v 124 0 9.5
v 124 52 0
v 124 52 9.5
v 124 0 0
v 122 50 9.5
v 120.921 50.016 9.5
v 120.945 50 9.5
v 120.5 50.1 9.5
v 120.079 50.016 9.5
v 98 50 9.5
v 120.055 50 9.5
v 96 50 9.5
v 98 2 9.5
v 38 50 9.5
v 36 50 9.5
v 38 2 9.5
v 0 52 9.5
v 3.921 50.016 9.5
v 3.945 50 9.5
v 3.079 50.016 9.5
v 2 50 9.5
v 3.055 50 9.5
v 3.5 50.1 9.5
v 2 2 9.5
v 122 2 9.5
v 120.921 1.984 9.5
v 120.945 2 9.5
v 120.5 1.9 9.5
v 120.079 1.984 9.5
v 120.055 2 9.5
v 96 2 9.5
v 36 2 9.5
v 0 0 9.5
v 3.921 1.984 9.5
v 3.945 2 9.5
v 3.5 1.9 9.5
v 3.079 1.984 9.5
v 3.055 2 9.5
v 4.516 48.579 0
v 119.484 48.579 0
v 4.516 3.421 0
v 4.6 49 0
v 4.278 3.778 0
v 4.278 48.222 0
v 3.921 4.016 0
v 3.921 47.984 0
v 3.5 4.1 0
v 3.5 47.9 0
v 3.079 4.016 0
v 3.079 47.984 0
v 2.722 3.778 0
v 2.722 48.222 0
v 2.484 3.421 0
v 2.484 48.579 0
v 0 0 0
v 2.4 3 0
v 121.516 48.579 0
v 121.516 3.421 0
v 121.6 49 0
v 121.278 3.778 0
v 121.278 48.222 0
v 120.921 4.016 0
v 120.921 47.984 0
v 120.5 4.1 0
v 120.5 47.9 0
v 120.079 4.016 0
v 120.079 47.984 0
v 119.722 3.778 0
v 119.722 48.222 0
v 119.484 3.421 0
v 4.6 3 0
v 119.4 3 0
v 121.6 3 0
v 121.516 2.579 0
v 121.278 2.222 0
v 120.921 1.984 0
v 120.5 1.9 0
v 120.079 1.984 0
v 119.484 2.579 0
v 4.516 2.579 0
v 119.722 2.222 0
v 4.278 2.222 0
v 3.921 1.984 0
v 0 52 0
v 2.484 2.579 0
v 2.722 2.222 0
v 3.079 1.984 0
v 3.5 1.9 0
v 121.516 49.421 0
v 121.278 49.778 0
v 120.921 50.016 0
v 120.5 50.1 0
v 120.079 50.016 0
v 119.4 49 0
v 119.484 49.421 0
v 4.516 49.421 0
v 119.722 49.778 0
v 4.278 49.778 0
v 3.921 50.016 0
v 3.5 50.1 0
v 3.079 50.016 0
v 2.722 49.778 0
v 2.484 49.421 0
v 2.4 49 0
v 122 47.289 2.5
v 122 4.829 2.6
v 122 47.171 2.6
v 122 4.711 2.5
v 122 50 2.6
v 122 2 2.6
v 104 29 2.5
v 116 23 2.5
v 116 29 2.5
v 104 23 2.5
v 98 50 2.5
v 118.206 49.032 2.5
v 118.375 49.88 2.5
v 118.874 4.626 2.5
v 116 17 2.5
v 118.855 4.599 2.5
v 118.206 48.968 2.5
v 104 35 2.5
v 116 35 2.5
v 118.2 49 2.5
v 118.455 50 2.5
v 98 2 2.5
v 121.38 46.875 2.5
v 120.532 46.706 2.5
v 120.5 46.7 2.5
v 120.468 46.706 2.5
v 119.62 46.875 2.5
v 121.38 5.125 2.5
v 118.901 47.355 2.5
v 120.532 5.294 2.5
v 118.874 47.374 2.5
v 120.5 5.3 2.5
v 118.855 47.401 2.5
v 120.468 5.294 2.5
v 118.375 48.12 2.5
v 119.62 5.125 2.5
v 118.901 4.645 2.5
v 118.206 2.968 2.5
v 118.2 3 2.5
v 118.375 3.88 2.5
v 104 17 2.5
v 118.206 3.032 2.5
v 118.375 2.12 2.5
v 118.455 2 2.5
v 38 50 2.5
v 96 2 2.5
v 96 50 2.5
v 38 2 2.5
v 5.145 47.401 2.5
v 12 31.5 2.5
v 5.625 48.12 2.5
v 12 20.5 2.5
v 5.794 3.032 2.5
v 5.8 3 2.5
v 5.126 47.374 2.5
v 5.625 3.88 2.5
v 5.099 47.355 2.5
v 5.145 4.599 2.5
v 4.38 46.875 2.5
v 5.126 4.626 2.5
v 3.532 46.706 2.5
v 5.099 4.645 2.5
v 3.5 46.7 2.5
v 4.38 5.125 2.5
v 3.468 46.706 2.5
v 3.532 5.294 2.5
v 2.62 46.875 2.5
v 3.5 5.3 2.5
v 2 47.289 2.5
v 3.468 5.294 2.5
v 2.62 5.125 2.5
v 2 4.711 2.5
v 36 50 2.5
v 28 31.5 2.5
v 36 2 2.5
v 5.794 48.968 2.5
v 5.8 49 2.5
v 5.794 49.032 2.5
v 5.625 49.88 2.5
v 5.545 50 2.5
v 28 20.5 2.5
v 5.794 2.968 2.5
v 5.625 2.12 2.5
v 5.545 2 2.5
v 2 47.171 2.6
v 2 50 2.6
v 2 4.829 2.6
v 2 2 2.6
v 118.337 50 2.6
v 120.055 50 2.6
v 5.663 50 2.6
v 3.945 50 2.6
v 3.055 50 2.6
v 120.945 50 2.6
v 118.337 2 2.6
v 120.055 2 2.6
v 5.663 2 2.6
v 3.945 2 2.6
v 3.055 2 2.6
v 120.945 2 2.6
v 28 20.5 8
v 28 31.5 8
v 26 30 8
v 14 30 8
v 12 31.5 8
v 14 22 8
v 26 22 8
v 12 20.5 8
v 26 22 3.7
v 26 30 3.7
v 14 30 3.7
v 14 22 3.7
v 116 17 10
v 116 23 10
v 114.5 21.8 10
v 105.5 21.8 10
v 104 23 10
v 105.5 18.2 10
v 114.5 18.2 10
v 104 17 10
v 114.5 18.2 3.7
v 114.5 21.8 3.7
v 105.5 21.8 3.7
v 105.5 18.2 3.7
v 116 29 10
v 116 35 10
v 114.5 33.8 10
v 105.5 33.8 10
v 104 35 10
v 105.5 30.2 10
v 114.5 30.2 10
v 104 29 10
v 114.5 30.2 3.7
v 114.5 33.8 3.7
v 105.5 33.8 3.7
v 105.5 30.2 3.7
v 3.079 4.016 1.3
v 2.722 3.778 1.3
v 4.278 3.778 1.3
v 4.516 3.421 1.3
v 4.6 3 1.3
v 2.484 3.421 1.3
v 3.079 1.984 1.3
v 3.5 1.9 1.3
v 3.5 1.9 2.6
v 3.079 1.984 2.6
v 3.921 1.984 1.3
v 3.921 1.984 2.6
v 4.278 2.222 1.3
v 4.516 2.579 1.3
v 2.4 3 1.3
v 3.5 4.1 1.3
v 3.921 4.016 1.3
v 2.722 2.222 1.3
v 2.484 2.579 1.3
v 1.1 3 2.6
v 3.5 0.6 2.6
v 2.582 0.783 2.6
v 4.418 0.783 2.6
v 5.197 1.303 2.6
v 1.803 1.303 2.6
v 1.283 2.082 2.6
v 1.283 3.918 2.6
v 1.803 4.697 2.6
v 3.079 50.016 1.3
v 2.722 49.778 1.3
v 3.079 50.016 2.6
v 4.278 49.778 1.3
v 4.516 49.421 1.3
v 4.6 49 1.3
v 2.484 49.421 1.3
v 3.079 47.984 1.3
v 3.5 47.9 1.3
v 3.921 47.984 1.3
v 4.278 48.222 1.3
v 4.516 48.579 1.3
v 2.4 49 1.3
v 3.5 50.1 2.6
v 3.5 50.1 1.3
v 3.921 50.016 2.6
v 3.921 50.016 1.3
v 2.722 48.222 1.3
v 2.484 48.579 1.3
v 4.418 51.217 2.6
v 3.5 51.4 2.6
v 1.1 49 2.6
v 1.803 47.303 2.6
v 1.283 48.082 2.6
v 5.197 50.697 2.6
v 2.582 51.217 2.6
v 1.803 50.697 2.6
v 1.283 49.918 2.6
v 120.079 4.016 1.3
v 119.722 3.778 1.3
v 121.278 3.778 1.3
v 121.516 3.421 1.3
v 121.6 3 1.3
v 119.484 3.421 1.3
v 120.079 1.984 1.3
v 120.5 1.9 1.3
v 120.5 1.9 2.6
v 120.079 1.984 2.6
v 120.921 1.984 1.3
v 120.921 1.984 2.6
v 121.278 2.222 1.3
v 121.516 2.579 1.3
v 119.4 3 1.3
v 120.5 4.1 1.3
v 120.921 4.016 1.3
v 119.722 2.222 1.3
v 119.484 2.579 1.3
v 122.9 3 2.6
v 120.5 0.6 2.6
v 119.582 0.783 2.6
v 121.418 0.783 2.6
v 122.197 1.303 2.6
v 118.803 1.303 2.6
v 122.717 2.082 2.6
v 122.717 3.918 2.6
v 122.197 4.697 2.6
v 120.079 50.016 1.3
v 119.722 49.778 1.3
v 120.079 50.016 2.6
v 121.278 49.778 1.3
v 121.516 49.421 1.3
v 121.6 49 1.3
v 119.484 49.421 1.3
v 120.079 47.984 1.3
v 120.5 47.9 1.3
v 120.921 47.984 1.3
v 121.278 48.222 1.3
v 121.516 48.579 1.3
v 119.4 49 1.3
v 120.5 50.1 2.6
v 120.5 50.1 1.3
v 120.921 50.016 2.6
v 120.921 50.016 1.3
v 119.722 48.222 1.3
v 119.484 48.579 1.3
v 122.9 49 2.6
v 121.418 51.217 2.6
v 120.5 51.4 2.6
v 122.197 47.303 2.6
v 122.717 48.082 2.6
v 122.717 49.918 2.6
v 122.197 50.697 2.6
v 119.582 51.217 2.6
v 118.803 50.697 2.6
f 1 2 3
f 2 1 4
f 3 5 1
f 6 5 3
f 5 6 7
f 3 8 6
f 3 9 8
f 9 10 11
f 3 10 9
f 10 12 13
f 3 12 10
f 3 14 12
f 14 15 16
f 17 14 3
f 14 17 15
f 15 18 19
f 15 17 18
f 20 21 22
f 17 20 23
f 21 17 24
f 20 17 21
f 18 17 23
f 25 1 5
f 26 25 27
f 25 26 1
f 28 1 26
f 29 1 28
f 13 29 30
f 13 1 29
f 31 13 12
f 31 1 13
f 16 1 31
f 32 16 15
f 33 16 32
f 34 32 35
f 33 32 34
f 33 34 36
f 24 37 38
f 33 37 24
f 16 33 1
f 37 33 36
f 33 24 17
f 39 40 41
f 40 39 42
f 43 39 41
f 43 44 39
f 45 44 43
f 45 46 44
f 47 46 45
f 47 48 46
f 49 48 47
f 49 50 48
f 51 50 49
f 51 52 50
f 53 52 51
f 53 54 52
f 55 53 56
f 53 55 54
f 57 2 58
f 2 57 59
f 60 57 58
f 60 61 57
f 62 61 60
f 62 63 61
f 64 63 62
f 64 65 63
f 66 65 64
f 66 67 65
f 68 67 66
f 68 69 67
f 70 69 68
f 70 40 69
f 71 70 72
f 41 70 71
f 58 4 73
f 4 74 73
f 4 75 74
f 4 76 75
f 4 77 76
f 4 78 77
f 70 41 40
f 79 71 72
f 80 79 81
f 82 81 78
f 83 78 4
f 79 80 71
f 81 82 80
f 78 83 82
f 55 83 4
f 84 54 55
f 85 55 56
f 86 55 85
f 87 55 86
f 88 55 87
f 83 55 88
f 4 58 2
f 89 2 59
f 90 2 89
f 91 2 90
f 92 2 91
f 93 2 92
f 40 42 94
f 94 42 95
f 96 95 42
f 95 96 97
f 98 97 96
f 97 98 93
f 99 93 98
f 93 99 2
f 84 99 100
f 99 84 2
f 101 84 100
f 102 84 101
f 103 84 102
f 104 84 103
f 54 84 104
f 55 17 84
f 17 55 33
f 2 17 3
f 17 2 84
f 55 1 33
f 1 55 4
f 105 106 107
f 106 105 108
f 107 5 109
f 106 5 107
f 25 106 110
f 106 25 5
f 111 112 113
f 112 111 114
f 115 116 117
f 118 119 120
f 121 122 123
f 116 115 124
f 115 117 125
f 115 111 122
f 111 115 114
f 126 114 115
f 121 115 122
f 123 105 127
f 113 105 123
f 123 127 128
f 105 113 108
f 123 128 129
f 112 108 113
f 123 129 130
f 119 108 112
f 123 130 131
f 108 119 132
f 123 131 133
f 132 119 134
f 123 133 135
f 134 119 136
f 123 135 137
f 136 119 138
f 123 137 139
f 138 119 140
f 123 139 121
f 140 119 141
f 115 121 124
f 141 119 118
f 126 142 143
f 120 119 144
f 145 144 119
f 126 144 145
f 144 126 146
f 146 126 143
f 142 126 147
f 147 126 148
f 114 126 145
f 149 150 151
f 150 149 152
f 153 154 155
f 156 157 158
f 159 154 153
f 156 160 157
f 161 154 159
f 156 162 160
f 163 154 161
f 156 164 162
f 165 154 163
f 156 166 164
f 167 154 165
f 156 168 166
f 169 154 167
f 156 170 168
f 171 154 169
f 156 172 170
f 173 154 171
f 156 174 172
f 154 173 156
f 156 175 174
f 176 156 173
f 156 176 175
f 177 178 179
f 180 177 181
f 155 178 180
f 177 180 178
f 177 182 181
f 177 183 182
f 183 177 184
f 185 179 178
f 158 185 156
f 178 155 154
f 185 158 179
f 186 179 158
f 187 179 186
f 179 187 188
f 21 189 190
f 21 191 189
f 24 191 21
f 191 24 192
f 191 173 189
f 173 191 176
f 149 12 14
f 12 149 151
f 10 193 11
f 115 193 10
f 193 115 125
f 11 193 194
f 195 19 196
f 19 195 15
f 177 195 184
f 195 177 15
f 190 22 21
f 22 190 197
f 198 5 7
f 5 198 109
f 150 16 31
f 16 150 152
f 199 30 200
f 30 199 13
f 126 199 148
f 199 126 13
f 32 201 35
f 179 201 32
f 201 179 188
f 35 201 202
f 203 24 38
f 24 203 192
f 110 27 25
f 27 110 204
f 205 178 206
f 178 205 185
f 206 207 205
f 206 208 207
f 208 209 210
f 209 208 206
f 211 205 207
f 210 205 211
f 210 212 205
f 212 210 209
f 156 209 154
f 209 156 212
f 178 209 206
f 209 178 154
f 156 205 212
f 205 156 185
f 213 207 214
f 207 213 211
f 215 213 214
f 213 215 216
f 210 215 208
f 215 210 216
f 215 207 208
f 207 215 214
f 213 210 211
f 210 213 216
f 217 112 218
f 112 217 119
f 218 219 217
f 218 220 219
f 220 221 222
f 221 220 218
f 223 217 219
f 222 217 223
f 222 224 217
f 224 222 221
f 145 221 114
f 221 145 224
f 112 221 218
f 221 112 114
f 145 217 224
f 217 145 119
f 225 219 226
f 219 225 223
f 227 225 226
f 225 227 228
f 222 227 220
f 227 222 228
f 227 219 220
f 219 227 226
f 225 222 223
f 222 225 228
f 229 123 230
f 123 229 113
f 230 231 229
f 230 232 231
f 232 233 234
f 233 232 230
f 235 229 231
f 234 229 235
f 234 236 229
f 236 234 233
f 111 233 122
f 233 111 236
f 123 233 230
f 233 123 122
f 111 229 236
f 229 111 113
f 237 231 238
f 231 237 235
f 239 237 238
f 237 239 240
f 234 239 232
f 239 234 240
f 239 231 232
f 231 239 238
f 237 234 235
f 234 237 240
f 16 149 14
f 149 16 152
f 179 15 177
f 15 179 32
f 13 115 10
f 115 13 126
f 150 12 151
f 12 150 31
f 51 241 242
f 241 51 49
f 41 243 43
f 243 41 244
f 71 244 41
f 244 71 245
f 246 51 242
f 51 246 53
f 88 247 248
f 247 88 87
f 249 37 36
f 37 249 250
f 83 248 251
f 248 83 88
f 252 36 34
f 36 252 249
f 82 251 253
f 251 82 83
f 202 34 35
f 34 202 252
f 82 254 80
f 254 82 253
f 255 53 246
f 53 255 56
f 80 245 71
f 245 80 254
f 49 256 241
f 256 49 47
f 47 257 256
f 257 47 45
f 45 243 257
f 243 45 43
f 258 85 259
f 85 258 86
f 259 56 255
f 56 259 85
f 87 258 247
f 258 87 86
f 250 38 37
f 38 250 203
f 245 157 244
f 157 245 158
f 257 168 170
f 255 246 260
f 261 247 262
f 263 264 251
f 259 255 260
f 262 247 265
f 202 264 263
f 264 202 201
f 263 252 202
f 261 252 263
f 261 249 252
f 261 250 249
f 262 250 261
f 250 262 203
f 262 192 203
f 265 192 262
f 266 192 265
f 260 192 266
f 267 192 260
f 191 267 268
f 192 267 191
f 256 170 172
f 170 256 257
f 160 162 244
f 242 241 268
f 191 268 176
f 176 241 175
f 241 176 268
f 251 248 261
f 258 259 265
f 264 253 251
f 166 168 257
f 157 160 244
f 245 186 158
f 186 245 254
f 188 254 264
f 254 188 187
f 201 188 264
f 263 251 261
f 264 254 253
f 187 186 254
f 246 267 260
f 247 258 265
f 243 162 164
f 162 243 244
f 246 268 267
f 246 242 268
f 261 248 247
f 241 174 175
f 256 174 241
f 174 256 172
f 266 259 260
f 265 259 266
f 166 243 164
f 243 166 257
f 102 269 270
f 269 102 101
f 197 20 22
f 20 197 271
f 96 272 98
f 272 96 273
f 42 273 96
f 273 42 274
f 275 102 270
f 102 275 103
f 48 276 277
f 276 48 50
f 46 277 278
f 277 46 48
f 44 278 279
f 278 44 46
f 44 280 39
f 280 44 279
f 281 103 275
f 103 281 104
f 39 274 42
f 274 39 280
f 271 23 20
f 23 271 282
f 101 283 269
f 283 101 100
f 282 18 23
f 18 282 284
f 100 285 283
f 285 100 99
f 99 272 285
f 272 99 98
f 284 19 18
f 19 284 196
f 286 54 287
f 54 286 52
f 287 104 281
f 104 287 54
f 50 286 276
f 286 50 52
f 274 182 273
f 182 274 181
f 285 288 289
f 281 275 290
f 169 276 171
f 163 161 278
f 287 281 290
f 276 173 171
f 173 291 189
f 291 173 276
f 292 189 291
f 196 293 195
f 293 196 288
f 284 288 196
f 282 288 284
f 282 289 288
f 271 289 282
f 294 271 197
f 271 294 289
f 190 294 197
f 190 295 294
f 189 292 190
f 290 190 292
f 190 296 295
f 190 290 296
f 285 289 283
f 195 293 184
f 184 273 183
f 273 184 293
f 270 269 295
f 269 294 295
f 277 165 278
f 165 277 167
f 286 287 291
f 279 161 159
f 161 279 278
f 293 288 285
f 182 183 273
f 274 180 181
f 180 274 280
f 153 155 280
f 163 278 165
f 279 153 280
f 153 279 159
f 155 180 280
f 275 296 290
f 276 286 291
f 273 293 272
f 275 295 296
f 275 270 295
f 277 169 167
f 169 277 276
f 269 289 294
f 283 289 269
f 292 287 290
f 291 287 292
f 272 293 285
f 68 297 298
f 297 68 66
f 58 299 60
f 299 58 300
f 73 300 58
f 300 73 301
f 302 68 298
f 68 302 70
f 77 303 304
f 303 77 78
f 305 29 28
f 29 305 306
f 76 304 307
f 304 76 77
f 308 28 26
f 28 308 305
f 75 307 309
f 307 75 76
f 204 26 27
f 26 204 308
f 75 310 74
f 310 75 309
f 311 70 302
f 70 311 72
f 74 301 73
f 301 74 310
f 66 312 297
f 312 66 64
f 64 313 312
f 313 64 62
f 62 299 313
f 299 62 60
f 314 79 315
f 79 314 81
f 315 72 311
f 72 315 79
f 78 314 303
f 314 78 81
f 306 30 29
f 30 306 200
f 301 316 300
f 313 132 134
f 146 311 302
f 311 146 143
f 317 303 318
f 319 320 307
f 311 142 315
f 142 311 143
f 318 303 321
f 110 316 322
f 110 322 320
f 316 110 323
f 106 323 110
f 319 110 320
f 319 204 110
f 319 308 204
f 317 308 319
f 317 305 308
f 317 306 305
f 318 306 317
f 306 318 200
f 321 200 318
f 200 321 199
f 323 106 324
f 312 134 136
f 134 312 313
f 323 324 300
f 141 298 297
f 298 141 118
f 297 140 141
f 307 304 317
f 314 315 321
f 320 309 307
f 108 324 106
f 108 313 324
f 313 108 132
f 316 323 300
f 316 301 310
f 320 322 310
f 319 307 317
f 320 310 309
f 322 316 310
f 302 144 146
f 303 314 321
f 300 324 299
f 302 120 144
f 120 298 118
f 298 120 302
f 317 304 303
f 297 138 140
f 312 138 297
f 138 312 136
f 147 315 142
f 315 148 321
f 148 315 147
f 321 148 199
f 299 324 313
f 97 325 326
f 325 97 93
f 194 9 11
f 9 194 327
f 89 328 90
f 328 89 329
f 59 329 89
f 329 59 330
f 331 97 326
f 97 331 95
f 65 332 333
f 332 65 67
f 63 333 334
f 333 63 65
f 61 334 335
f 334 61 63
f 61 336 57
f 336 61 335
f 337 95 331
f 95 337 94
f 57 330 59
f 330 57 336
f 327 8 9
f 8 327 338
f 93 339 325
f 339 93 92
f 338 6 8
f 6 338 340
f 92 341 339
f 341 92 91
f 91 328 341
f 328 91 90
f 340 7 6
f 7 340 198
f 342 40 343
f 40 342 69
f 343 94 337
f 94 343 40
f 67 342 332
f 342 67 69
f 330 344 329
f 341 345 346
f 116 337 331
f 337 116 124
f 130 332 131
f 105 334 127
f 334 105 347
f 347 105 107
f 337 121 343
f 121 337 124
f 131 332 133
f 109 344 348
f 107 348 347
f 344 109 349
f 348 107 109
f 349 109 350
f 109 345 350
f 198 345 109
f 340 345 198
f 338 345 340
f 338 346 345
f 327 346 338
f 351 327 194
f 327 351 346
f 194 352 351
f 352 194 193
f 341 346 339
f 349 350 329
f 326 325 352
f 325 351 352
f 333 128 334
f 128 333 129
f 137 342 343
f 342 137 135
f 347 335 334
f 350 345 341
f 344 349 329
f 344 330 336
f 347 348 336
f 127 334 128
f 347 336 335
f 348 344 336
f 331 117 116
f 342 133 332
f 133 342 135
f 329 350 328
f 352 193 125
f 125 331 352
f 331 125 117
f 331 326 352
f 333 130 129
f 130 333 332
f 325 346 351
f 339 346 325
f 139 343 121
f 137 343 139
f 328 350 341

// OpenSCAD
// file: ../../00_common/screw_bosses.scad
// =============================================================================
// OpenMotorBridge - Screw Bosses & Fastener Primitives
// =============================================================================
// File: hardware/cad/scad/00_common/screw_bosses.scad
// Description: Reusable parametric modules for screw standoffs, corner clamping
//              posts, and mounting ears.
// =============================================================================

include <parameters.scad>;

// 1. Cylindrical Screw Standoff Boss (with center hole)
module screw_boss(outer_r=2.5, inner_r=1.2, h=5.0) {
    difference() {
        cylinder(r=outer_r, h=h, center=false);
        translate([0, 0, -0.1])
            cylinder(r=inner_r, h=h + 0.2, center=false);
    }
}

// 2. Rectangular Corner Clamping Post (with center screw hole)
module corner_screw_post(size_x=5.0, size_y=5.0, h=12.0, hole_r=1.65, hole_h=10.0, hole_offset_z=2.0) {
    difference() {
        cube(size=[size_x, size_y, h], center=false);
        translate([size_x/2.0, size_y/2.0, hole_offset_z])
            cylinder(r=hole_r, h=hole_h + 0.1, center=false);
    }
}

// 3. M4 Silentblock Outer Mounting Ear (Centered in Y around y=0, extends along +X)
module mounting_ear_m4(ear_len=14.0, ear_w=12.0, ear_h=5.0, hole_r=2.2) {
    difference() {
        union() {
            translate([0, -ear_w/2.0, 0])
                cube(size=[ear_len - ear_w/2.0, ear_w, ear_h], center=false);
            translate([ear_len - ear_w/2.0, 0, 0])
                cylinder(r=ear_w/2.0, h=ear_h, center=false);
        }
        translate([ear_len - ear_w/2.0, 0, -0.1])
            cylinder(r=hole_r, h=ear_h + 0.2, center=false);
    }
}

// 4. Captive Hex Nut Pocket (DIN 934 / DIN 985 with center screw through-hole)
module hex_nut_pocket(sw=NUT_M4_SW, h=NUT_M4_H, screw_r=M4_SCREW_HOLE_R, through_h=10.0) {
    // Hexagonal pocket (flat-to-flat SW converted to circle radius: r = sw / sqrt(3))
    hex_r = sw / sqrt(3);
    union() {
        // Hexagonal nut pocket
        cylinder(r=hex_r, h=h, center=false, $fn=6);
        // Screw clearance through-hole
        translate([0, 0, -through_h/2.0])
            cylinder(r=screw_r, h=through_h + h, center=false, $fn=30);
    }
}
// file: ../../00_common/parameters.scad
// =============================================================================
// OpenMotorBridge - Global CAD Parameters & Settings
// =============================================================================
// File: hardware/cad/scad/00_common/parameters.scad
// Description: Global dimensional constants, manufacturing clearances and
//              circle resolution ($fn) for all OpenSCAD modules.
// =============================================================================

// --- 1. Circle & Curve Resolution ---
$fn = 60; // Smooth cylinders and holes for high-quality MJF 3D printing

// --- 2. Central Main Box Dimensions (3-Tier Sandwich) ---
MAIN_BOX_OUTER_L      = 110.0; // Outer length in X (mm)
MAIN_BOX_OUTER_W      = 74.0;  // Outer width in Y (mm)
MAIN_BOX_LOWER_H      = 17.0;  // Lower case height in Z (mm)
MAIN_BOX_MID_H        = 15.0;  // Mid tray height in Z (mm)
MAIN_BOX_LID_H        = 4.0;   // Lid plate thickness in Z (mm)
MAIN_BOX_WALL         = 2.5;   // Nominal wall thickness (mm)
MAIN_BOX_CORNER_POST  = 7.0;   // Corner clamping screw post size (mm, for M3 hex nut pockets)

// --- 3. Satellite Pod Dimensions (Universal Enlarged Envelope) ---
POD_OUTER_L           = 150.0; // Outer length in X (mm, standardized for serial PCBA 03 + Cardo/Sena/OMM)
POD_OUTER_W           = 70.0;  // Outer width in Y (mm)
POD_OUTER_H           = 38.0;  // Outer height in Z (mm)
POD_WALL              = 3.5;   // Nominal wall thickness (mm)
POD_BULKHEAD_X        = 18.0;  // Partition bulkhead position in X (mm)
POD_CHAMBER_L         = 132.0; // Sliding chamber length in X (mm, clears 130mm sled + 2mm margin)
POD_CHAMBER_W         = 63.0;  // Sliding chamber width in Y (mm)
POD_CHAMBER_H         = 31.0;  // Sliding chamber height in Z (mm)

// --- 4. Pod Linear Guide Rails (Poka-Yoke Tongue & Groove) ---
POD_GROOVE_W          = 3.0;   // Internal guide groove width in Z (mm)
POD_GROOVE_DEPTH      = 1.5;   // Internal guide groove depth in Y (mm)
POD_GROOVE_LEFT_Z     = 10.0;  // Center height of left groove (mm)
POD_GROOVE_RIGHT_Z    = 18.0;  // Center height of right groove (mm, asym offset)

CARTRIDGE_TONGUE_W    = 2.6;   // Cartridge tongue rail height in Z (mm, 0.2mm clearance)
CARTRIDGE_TONGUE_PROT = 1.4;   // Cartridge tongue protrusion in Y (mm, 0.1mm clearance)
CARTRIDGE_CHAMFER_L   = 4.0;   // 30° lead-in chamfer nose length (mm)

// --- 5. Cartridge Dimensions (Enlarged Universal Sled) ---
CARTRIDGE_BASE_L      = 130.0; // Sled length in X (mm, accommodates PCBA 03 + OEM Cardo Air-Mount/Sena/OMM serial layout)
CARTRIDGE_BASE_W      = 58.0;  // Sled width in Y (mm)
CARTRIDGE_BASE_H      = 28.0;  // Sled height in Z (mm)
CARTRIDGE_FACE_L      = 4.0;   // Front faceplate thickness in X (mm)
CARTRIDGE_FACE_W      = 64.0;  // Front faceplate width in Y (mm)
CARTRIDGE_FACE_H      = 34.0;  // Front faceplate height in Z (mm)

// --- 5a. RF Interface & Sealing Dimensions ---
SMA_BORE_R            = 3.25;  // Ø 6.5 mm through-hole for standard SMA bulkhead
SMA_ORECESS_R         = 4.75;  // Ø 9.5 mm recess for waterproof silicone O-ring
SMA_ORECESS_DEPTH     = 1.2;   // 1.2 mm deep O-ring compression pocket

// --- 5b. Magnetic Anti-Theft Lock System ---
LATCH_PIVOT_X         = 65.0;  // Center pivot position along sled X (mm, centered on 130mm sled)
LATCH_MAGNET_X        = 53.0;  // Ferromagnetic anchor position along sled X (mm)
LATCH_TOOTH_X         = 77.0;  // Locking sawtooth pawl position along sled X (mm)
LATCH_ARM_H           = 6.0;   // Rocker lever height in Z (mm)
LATCH_ARM_THICK       = 2.6;   // Rocker beam thickness in Y (mm)
LATCH_MAGNET_PIN_DIA  = 6.2;   // Bore for Ø 6.0 mm steel dowel pin (mm)
LATCH_SPRING_DIA      = 3.8;   // Bore for Ø 3.5 mm return compression spring (mm)

// --- 6. Standard Captive Hex Nut Pockets (DIN 934 / DIN 985 with +0.2 mm MJF/FDM clearance) ---
NUT_M2_SW             = 4.2;   // M2 across flats (nominal 4.0 mm)
NUT_M2_H              = 1.8;   // M2 thickness (nominal 1.6 mm)
NUT_M2_5_SW           = 5.2;   // M2.5 across flats (nominal 5.0 mm)
NUT_M2_5_H            = 2.2;   // M2.5 thickness (nominal 2.0 mm)
NUT_M3_SW             = 5.7;   // M3 across flats (nominal 5.5 mm)
NUT_M3_H              = 2.6;   // M3 thickness (nominal 2.4 mm)
NUT_M4_SW             = 7.2;   // M4 across flats (nominal 7.0 mm)
NUT_M4_H              = 3.4;   // M4 thickness (nominal 3.2 mm)
NUT_M5_SW             = 8.2;   // M5 across flats (nominal 8.0 mm)
NUT_M5_H              = 4.2;   // M5 thickness (nominal 4.0 mm)

// Direct Plastic Thread-Forming / Self-Tapping Pilot Holes in PA12 (100% Soldering-Iron Free)
M2_PILOT_HOLE_R       = 0.85;  // Core hole for M2 screws in PA12 (Ø 1.7 mm)
M2_5_PILOT_HOLE_R     = 1.05;  // Core hole for M2.5 screws in PA12 (Ø 2.1 mm)
M3_PILOT_HOLE_R       = 1.25;  // Core hole for M3 screws in PA12 (Ø 2.5 mm)

// --- 7. Screw & Clearance Dimensions ---
M2_SCREW_HOLE_R       = 1.1;   // M2 clearance hole (r = 1.1 mm -> Ø 2.2 mm)
M2_5_SCREW_HOLE_R     = 1.4;   // M2.5 clearance hole (r = 1.4 mm -> Ø 2.8 mm)
M3_SCREW_HOLE_R       = 1.65;  // M3 clearance hole (r = 1.65 mm -> Ø 3.3 mm)
M4_SCREW_HOLE_R       = 2.2;   // M4 clearance hole (r = 2.2 mm -> Ø 4.4 mm)
M8_BORE_R             = 4.0;   // M8 cable through-bore (r = 4.0 mm -> Ø 8.0 mm)
M8_STUDS_OUTER_R      = 6.0;   // M8 neck outer radius (Ø 12.0 mm)

// --- 8. Universal Front Node Enclosure Dimensions (Type E: 98 x 68 x 25 mm) ---
FRONT_NODE_PCB_L      = 82.0;  // PCB length in X (mm, PCBA 05)
FRONT_NODE_PCB_W      = 50.0;  // PCB width in Y (mm, PCBA 05)
FRONT_NODE_PCB_H      = 1.6;   // PCB thickness in Z (mm)
FRONT_NODE_PCB_R      = 2.5;   // PCB corner radius (mm)

FRONT_NODE_CHAMBER_L  = 86.0;  // Internal chamber length in X (mm, 2mm margin per side)
FRONT_NODE_CHAMBER_W  = 56.0;  // Internal chamber width in Y (mm, 3mm margin per side)
FRONT_NODE_TUB_H      = 17.5;  // Lower tub depth in Z (mm)
FRONT_NODE_LID_H      = 7.5;   // Upper lid height in Z (mm)
FRONT_NODE_WALL       = 2.5;   // Wall thickness in HP MJF PA12 (mm)
FRONT_NODE_CORNER_R   = 4.0;   // Outer enclosure corner radius (mm)

FRONT_NODE_OUTER_L    = FRONT_NODE_CHAMBER_L + 2 * FRONT_NODE_WALL + 7.0; // 98.0 mm
FRONT_NODE_OUTER_W    = FRONT_NODE_CHAMBER_W + 2 * FRONT_NODE_WALL + 7.0; // 68.0 mm
FRONT_NODE_OUTER_H    = FRONT_NODE_TUB_H + FRONT_NODE_LID_H;              // 25.0 mm

// PCB Standoff Heights & Radii (100% Soldering-Iron Free)
FRONT_NODE_STANDOFF_H = 3.0;   // Height of PCB standoffs from floor (mm)
FRONT_NODE_STANDOFF_R = 3.0;   // Outer radius of M2.5 screw bosses (mm)
FRONT_NODE_CORE_HOLE_R= M2_5_PILOT_HOLE_R; // Core hole for direct M2.5 screw engagement (Ø 2.1 mm)

// AMPS 4-Hole Mounting Pattern (38 x 30 mm with DIN 934 M4 Captive Nut Pockets)
AMPS_SPACING_X        = 38.0;  // AMPS hole distance in X (mm)
AMPS_SPACING_Y        = 30.0;  // AMPS hole distance in Y (mm)
AMPS_NUT_SW           = NUT_M4_SW; // Captive M4 hex nut pocket across flats (7.2 mm)
AMPS_NUT_H            = NUT_M4_H;  // Captive M4 hex nut pocket depth (3.4 mm)

// Acoustic Vent for Knowles SPH0645 MEMS
FRONT_NODE_MIC_HOLE_R = 1.25;  // Sound canal radius (Ø 2.5 mm)
FRONT_NODE_MIC_MEMB_R = 3.0;   // Gore ePTFE membrane pocket radius (Ø 6.0 mm)
FRONT_NODE_MIC_MEMB_D = 0.8;   // Membrane pocket depth (mm)
// main file
// =============================================================================
// OpenMotorBridge - Satellite Pod: Leerkassette / Staufach Einlegeboden
// =============================================================================
// File: hardware/cad/scad/03_pod_cartridges/parts/03_insert_blindkassette.scad
// Description: Clean organizer insert plate mounted directly on the sled floor (am Boden):
//              - Sits at Z = 2.5 mm on sled floor, screwed into 4x M2 corner bosses
//              - Front bay: Contoured retention cradle for emergency motorcycle spare key
//              - Middle bay: Deep open storage compartment for folded registration papers / cash
//              - Rear bay: 2x friction clip slots for mini-blade backup fuses (10A & 15A)
//              - 100% open-top design: sealed and protected by the pod tunnel upon insertion
// =============================================================================

include <../../00_common/parameters.scad>;
include <../../00_common/screw_bosses.scad>;

module cartridge_insert_blindkassette(
    insert_l = CARTRIDGE_BASE_L - 6.0, // 124.0 mm for CARTRIDGE_BASE_L = 130.0
    insert_w = 52.0,
    plate_th = 2.5,
    wall_h   = 9.5
) {
    difference() {
        union() {
            // 1. Solid Bottom Plate (sitting directly on sled floor)
            cube([insert_l, insert_w, plate_th], center=false);

            // 2. Perimeter Rim Rib (protects items, gives rigid tray structure)
            difference() {
                cube([insert_l, insert_w, wall_h], center=false);
                translate([2.0, 2.0, plate_th])
                    cube([insert_l - 4.0, insert_w - 4.0, wall_h + 1.0], center=false);
            }

            // 3. Divider Partitions
            // Front partition at X = 36.0 mm (Key bay)
            translate([36.0, 2.0, plate_th])
                cube([2.0, insert_w - 4.0, wall_h - plate_th]);
            // Rear partition at X = 96.0 mm (Document bay to Fuse bay)
            translate([96.0, 2.0, plate_th])
                cube([2.0, insert_w - 4.0, wall_h - plate_th]);

            // 4. Emergency Motorcycle Key Retention Cradle (Front Bay)
            translate([12.0, insert_w/2.0 - 5.5, plate_th]) {
                difference() {
                    cube([16.0, 11.0, 5.5]);
                    translate([2.0, 1.5, 1.2])
                        cube([12.0, 8.0, 5.0]);
                }
            }

            // 5. 2x Mini-Blade Fuse Retention Clips (Rear Bay)
            for (fy = [insert_w/2.0 - 9.0, insert_w/2.0 + 3.0]) {
                translate([104.0, fy, plate_th]) {
                    difference() {
                        cube([12.0, 6.0, 7.5]);
                        translate([1.5, 1.2, 1.2])
                            cube([9.0, 3.6, 7.0]);
                    }
                }
            }
        }

        // 6. 4x M2 Countersunk Screw Mounting Holes into Sled Floor Corner Bosses
        // Boss positions in base sled: X=6.0, L-7.0, Y=6.0, W-6.0 relative to sled [0,0]
        // Sled insert is translated by [3.0, (58-52)/2=3.0], so local holes are at:
        // X = 3.5, insert_l - 3.5; Y = 3.0, insert_w - 3.0
        for (hx = [3.5, insert_l - 3.5]) {
            for (hy = [3.0, insert_w - 3.0]) {
                translate([hx, hy, -0.5]) {
                    cylinder(r=M2_SCREW_HOLE_R, h=wall_h + 2.0, center=false, $fn=16);
                    translate([0, 0, plate_th - 1.2 + 0.5])
                        cylinder(r1=M2_SCREW_HOLE_R, r2=2.4, h=1.3, center=false, $fn=16);
                }
            }
        }
    }
}

// Standalone printable preview
cartridge_insert_blindkassette();
